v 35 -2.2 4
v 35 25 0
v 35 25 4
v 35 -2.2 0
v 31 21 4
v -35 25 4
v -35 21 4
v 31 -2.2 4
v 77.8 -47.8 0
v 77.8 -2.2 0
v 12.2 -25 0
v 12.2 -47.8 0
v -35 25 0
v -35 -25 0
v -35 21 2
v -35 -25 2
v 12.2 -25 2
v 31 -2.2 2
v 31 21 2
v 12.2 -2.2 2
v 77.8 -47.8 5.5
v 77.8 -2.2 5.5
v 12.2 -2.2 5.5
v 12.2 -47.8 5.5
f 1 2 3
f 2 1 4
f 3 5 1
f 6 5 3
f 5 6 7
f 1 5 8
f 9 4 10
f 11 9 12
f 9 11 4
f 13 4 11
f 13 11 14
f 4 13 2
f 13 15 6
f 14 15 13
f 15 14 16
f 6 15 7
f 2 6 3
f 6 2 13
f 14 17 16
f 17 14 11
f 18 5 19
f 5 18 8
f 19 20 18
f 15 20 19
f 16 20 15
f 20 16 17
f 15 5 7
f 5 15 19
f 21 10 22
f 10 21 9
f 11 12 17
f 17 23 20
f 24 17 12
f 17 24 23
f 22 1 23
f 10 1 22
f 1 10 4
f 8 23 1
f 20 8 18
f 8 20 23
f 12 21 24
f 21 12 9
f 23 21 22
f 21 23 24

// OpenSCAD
// Two-part enclosure for a small electronics board (e.g. Arduino-based temperature logger)
// Print orientation: both parts lie on the bed, side by side, with a 10 mm gap.
// The lid is printed upside down so its lip forms an overhang (a solid block here).

// ---------------- Parameters ----------------
box_x      = 70;    // box outer length (X)
box_y      = 50;    // box outer width (Y)
box_z      = 30;    // box outer height (Z)
wall       = 2;     // box wall thickness
floor      = 2;     // box floor thickness

lip_t      = 1.5;   // lid lip thickness
lip_h      = 4;     // lid lip height (from plate top)
lip_x      = 65.6;  // lip outer length (X)
lip_y      = 45.6;  // lip outer width (Y)
lip_over   = 0.2;   // lip overlap into box opening (clearance on each side)

eps        = 0.5;   // cutter overshoot past faces
gap        = 10;    // gap between box and lid on the bed

$fn = 64;

// ---------------- Model ----------------
union() {
    // Part 1: open-top box
    translate([-box_x/2, -box_y/2, 0])
        difference() {
            cube([box_x, box_y, floor + wall]);   // floor + side walls
            translate([0, 0, floor])
                cube([box_x - 2*wall, box_y - 2*wall, wall + eps]);  // open top
        }

    // Part 2: lid (printed upside down: plate on bed, lip on top)
    translate([box_x/2 + gap, -box_y/2, 0])
        union() {
            // base plate
            translate([-lip_x/2, -lip_y/2, 0])
                cube([lip_x, lip_y, lip_t]);
            // rectangular lip, centred on the plate
            translate([-lip_x/2, -lip_y/2, lip_t])
                cube([lip_x, lip_y, lip_h]);
        }
}
